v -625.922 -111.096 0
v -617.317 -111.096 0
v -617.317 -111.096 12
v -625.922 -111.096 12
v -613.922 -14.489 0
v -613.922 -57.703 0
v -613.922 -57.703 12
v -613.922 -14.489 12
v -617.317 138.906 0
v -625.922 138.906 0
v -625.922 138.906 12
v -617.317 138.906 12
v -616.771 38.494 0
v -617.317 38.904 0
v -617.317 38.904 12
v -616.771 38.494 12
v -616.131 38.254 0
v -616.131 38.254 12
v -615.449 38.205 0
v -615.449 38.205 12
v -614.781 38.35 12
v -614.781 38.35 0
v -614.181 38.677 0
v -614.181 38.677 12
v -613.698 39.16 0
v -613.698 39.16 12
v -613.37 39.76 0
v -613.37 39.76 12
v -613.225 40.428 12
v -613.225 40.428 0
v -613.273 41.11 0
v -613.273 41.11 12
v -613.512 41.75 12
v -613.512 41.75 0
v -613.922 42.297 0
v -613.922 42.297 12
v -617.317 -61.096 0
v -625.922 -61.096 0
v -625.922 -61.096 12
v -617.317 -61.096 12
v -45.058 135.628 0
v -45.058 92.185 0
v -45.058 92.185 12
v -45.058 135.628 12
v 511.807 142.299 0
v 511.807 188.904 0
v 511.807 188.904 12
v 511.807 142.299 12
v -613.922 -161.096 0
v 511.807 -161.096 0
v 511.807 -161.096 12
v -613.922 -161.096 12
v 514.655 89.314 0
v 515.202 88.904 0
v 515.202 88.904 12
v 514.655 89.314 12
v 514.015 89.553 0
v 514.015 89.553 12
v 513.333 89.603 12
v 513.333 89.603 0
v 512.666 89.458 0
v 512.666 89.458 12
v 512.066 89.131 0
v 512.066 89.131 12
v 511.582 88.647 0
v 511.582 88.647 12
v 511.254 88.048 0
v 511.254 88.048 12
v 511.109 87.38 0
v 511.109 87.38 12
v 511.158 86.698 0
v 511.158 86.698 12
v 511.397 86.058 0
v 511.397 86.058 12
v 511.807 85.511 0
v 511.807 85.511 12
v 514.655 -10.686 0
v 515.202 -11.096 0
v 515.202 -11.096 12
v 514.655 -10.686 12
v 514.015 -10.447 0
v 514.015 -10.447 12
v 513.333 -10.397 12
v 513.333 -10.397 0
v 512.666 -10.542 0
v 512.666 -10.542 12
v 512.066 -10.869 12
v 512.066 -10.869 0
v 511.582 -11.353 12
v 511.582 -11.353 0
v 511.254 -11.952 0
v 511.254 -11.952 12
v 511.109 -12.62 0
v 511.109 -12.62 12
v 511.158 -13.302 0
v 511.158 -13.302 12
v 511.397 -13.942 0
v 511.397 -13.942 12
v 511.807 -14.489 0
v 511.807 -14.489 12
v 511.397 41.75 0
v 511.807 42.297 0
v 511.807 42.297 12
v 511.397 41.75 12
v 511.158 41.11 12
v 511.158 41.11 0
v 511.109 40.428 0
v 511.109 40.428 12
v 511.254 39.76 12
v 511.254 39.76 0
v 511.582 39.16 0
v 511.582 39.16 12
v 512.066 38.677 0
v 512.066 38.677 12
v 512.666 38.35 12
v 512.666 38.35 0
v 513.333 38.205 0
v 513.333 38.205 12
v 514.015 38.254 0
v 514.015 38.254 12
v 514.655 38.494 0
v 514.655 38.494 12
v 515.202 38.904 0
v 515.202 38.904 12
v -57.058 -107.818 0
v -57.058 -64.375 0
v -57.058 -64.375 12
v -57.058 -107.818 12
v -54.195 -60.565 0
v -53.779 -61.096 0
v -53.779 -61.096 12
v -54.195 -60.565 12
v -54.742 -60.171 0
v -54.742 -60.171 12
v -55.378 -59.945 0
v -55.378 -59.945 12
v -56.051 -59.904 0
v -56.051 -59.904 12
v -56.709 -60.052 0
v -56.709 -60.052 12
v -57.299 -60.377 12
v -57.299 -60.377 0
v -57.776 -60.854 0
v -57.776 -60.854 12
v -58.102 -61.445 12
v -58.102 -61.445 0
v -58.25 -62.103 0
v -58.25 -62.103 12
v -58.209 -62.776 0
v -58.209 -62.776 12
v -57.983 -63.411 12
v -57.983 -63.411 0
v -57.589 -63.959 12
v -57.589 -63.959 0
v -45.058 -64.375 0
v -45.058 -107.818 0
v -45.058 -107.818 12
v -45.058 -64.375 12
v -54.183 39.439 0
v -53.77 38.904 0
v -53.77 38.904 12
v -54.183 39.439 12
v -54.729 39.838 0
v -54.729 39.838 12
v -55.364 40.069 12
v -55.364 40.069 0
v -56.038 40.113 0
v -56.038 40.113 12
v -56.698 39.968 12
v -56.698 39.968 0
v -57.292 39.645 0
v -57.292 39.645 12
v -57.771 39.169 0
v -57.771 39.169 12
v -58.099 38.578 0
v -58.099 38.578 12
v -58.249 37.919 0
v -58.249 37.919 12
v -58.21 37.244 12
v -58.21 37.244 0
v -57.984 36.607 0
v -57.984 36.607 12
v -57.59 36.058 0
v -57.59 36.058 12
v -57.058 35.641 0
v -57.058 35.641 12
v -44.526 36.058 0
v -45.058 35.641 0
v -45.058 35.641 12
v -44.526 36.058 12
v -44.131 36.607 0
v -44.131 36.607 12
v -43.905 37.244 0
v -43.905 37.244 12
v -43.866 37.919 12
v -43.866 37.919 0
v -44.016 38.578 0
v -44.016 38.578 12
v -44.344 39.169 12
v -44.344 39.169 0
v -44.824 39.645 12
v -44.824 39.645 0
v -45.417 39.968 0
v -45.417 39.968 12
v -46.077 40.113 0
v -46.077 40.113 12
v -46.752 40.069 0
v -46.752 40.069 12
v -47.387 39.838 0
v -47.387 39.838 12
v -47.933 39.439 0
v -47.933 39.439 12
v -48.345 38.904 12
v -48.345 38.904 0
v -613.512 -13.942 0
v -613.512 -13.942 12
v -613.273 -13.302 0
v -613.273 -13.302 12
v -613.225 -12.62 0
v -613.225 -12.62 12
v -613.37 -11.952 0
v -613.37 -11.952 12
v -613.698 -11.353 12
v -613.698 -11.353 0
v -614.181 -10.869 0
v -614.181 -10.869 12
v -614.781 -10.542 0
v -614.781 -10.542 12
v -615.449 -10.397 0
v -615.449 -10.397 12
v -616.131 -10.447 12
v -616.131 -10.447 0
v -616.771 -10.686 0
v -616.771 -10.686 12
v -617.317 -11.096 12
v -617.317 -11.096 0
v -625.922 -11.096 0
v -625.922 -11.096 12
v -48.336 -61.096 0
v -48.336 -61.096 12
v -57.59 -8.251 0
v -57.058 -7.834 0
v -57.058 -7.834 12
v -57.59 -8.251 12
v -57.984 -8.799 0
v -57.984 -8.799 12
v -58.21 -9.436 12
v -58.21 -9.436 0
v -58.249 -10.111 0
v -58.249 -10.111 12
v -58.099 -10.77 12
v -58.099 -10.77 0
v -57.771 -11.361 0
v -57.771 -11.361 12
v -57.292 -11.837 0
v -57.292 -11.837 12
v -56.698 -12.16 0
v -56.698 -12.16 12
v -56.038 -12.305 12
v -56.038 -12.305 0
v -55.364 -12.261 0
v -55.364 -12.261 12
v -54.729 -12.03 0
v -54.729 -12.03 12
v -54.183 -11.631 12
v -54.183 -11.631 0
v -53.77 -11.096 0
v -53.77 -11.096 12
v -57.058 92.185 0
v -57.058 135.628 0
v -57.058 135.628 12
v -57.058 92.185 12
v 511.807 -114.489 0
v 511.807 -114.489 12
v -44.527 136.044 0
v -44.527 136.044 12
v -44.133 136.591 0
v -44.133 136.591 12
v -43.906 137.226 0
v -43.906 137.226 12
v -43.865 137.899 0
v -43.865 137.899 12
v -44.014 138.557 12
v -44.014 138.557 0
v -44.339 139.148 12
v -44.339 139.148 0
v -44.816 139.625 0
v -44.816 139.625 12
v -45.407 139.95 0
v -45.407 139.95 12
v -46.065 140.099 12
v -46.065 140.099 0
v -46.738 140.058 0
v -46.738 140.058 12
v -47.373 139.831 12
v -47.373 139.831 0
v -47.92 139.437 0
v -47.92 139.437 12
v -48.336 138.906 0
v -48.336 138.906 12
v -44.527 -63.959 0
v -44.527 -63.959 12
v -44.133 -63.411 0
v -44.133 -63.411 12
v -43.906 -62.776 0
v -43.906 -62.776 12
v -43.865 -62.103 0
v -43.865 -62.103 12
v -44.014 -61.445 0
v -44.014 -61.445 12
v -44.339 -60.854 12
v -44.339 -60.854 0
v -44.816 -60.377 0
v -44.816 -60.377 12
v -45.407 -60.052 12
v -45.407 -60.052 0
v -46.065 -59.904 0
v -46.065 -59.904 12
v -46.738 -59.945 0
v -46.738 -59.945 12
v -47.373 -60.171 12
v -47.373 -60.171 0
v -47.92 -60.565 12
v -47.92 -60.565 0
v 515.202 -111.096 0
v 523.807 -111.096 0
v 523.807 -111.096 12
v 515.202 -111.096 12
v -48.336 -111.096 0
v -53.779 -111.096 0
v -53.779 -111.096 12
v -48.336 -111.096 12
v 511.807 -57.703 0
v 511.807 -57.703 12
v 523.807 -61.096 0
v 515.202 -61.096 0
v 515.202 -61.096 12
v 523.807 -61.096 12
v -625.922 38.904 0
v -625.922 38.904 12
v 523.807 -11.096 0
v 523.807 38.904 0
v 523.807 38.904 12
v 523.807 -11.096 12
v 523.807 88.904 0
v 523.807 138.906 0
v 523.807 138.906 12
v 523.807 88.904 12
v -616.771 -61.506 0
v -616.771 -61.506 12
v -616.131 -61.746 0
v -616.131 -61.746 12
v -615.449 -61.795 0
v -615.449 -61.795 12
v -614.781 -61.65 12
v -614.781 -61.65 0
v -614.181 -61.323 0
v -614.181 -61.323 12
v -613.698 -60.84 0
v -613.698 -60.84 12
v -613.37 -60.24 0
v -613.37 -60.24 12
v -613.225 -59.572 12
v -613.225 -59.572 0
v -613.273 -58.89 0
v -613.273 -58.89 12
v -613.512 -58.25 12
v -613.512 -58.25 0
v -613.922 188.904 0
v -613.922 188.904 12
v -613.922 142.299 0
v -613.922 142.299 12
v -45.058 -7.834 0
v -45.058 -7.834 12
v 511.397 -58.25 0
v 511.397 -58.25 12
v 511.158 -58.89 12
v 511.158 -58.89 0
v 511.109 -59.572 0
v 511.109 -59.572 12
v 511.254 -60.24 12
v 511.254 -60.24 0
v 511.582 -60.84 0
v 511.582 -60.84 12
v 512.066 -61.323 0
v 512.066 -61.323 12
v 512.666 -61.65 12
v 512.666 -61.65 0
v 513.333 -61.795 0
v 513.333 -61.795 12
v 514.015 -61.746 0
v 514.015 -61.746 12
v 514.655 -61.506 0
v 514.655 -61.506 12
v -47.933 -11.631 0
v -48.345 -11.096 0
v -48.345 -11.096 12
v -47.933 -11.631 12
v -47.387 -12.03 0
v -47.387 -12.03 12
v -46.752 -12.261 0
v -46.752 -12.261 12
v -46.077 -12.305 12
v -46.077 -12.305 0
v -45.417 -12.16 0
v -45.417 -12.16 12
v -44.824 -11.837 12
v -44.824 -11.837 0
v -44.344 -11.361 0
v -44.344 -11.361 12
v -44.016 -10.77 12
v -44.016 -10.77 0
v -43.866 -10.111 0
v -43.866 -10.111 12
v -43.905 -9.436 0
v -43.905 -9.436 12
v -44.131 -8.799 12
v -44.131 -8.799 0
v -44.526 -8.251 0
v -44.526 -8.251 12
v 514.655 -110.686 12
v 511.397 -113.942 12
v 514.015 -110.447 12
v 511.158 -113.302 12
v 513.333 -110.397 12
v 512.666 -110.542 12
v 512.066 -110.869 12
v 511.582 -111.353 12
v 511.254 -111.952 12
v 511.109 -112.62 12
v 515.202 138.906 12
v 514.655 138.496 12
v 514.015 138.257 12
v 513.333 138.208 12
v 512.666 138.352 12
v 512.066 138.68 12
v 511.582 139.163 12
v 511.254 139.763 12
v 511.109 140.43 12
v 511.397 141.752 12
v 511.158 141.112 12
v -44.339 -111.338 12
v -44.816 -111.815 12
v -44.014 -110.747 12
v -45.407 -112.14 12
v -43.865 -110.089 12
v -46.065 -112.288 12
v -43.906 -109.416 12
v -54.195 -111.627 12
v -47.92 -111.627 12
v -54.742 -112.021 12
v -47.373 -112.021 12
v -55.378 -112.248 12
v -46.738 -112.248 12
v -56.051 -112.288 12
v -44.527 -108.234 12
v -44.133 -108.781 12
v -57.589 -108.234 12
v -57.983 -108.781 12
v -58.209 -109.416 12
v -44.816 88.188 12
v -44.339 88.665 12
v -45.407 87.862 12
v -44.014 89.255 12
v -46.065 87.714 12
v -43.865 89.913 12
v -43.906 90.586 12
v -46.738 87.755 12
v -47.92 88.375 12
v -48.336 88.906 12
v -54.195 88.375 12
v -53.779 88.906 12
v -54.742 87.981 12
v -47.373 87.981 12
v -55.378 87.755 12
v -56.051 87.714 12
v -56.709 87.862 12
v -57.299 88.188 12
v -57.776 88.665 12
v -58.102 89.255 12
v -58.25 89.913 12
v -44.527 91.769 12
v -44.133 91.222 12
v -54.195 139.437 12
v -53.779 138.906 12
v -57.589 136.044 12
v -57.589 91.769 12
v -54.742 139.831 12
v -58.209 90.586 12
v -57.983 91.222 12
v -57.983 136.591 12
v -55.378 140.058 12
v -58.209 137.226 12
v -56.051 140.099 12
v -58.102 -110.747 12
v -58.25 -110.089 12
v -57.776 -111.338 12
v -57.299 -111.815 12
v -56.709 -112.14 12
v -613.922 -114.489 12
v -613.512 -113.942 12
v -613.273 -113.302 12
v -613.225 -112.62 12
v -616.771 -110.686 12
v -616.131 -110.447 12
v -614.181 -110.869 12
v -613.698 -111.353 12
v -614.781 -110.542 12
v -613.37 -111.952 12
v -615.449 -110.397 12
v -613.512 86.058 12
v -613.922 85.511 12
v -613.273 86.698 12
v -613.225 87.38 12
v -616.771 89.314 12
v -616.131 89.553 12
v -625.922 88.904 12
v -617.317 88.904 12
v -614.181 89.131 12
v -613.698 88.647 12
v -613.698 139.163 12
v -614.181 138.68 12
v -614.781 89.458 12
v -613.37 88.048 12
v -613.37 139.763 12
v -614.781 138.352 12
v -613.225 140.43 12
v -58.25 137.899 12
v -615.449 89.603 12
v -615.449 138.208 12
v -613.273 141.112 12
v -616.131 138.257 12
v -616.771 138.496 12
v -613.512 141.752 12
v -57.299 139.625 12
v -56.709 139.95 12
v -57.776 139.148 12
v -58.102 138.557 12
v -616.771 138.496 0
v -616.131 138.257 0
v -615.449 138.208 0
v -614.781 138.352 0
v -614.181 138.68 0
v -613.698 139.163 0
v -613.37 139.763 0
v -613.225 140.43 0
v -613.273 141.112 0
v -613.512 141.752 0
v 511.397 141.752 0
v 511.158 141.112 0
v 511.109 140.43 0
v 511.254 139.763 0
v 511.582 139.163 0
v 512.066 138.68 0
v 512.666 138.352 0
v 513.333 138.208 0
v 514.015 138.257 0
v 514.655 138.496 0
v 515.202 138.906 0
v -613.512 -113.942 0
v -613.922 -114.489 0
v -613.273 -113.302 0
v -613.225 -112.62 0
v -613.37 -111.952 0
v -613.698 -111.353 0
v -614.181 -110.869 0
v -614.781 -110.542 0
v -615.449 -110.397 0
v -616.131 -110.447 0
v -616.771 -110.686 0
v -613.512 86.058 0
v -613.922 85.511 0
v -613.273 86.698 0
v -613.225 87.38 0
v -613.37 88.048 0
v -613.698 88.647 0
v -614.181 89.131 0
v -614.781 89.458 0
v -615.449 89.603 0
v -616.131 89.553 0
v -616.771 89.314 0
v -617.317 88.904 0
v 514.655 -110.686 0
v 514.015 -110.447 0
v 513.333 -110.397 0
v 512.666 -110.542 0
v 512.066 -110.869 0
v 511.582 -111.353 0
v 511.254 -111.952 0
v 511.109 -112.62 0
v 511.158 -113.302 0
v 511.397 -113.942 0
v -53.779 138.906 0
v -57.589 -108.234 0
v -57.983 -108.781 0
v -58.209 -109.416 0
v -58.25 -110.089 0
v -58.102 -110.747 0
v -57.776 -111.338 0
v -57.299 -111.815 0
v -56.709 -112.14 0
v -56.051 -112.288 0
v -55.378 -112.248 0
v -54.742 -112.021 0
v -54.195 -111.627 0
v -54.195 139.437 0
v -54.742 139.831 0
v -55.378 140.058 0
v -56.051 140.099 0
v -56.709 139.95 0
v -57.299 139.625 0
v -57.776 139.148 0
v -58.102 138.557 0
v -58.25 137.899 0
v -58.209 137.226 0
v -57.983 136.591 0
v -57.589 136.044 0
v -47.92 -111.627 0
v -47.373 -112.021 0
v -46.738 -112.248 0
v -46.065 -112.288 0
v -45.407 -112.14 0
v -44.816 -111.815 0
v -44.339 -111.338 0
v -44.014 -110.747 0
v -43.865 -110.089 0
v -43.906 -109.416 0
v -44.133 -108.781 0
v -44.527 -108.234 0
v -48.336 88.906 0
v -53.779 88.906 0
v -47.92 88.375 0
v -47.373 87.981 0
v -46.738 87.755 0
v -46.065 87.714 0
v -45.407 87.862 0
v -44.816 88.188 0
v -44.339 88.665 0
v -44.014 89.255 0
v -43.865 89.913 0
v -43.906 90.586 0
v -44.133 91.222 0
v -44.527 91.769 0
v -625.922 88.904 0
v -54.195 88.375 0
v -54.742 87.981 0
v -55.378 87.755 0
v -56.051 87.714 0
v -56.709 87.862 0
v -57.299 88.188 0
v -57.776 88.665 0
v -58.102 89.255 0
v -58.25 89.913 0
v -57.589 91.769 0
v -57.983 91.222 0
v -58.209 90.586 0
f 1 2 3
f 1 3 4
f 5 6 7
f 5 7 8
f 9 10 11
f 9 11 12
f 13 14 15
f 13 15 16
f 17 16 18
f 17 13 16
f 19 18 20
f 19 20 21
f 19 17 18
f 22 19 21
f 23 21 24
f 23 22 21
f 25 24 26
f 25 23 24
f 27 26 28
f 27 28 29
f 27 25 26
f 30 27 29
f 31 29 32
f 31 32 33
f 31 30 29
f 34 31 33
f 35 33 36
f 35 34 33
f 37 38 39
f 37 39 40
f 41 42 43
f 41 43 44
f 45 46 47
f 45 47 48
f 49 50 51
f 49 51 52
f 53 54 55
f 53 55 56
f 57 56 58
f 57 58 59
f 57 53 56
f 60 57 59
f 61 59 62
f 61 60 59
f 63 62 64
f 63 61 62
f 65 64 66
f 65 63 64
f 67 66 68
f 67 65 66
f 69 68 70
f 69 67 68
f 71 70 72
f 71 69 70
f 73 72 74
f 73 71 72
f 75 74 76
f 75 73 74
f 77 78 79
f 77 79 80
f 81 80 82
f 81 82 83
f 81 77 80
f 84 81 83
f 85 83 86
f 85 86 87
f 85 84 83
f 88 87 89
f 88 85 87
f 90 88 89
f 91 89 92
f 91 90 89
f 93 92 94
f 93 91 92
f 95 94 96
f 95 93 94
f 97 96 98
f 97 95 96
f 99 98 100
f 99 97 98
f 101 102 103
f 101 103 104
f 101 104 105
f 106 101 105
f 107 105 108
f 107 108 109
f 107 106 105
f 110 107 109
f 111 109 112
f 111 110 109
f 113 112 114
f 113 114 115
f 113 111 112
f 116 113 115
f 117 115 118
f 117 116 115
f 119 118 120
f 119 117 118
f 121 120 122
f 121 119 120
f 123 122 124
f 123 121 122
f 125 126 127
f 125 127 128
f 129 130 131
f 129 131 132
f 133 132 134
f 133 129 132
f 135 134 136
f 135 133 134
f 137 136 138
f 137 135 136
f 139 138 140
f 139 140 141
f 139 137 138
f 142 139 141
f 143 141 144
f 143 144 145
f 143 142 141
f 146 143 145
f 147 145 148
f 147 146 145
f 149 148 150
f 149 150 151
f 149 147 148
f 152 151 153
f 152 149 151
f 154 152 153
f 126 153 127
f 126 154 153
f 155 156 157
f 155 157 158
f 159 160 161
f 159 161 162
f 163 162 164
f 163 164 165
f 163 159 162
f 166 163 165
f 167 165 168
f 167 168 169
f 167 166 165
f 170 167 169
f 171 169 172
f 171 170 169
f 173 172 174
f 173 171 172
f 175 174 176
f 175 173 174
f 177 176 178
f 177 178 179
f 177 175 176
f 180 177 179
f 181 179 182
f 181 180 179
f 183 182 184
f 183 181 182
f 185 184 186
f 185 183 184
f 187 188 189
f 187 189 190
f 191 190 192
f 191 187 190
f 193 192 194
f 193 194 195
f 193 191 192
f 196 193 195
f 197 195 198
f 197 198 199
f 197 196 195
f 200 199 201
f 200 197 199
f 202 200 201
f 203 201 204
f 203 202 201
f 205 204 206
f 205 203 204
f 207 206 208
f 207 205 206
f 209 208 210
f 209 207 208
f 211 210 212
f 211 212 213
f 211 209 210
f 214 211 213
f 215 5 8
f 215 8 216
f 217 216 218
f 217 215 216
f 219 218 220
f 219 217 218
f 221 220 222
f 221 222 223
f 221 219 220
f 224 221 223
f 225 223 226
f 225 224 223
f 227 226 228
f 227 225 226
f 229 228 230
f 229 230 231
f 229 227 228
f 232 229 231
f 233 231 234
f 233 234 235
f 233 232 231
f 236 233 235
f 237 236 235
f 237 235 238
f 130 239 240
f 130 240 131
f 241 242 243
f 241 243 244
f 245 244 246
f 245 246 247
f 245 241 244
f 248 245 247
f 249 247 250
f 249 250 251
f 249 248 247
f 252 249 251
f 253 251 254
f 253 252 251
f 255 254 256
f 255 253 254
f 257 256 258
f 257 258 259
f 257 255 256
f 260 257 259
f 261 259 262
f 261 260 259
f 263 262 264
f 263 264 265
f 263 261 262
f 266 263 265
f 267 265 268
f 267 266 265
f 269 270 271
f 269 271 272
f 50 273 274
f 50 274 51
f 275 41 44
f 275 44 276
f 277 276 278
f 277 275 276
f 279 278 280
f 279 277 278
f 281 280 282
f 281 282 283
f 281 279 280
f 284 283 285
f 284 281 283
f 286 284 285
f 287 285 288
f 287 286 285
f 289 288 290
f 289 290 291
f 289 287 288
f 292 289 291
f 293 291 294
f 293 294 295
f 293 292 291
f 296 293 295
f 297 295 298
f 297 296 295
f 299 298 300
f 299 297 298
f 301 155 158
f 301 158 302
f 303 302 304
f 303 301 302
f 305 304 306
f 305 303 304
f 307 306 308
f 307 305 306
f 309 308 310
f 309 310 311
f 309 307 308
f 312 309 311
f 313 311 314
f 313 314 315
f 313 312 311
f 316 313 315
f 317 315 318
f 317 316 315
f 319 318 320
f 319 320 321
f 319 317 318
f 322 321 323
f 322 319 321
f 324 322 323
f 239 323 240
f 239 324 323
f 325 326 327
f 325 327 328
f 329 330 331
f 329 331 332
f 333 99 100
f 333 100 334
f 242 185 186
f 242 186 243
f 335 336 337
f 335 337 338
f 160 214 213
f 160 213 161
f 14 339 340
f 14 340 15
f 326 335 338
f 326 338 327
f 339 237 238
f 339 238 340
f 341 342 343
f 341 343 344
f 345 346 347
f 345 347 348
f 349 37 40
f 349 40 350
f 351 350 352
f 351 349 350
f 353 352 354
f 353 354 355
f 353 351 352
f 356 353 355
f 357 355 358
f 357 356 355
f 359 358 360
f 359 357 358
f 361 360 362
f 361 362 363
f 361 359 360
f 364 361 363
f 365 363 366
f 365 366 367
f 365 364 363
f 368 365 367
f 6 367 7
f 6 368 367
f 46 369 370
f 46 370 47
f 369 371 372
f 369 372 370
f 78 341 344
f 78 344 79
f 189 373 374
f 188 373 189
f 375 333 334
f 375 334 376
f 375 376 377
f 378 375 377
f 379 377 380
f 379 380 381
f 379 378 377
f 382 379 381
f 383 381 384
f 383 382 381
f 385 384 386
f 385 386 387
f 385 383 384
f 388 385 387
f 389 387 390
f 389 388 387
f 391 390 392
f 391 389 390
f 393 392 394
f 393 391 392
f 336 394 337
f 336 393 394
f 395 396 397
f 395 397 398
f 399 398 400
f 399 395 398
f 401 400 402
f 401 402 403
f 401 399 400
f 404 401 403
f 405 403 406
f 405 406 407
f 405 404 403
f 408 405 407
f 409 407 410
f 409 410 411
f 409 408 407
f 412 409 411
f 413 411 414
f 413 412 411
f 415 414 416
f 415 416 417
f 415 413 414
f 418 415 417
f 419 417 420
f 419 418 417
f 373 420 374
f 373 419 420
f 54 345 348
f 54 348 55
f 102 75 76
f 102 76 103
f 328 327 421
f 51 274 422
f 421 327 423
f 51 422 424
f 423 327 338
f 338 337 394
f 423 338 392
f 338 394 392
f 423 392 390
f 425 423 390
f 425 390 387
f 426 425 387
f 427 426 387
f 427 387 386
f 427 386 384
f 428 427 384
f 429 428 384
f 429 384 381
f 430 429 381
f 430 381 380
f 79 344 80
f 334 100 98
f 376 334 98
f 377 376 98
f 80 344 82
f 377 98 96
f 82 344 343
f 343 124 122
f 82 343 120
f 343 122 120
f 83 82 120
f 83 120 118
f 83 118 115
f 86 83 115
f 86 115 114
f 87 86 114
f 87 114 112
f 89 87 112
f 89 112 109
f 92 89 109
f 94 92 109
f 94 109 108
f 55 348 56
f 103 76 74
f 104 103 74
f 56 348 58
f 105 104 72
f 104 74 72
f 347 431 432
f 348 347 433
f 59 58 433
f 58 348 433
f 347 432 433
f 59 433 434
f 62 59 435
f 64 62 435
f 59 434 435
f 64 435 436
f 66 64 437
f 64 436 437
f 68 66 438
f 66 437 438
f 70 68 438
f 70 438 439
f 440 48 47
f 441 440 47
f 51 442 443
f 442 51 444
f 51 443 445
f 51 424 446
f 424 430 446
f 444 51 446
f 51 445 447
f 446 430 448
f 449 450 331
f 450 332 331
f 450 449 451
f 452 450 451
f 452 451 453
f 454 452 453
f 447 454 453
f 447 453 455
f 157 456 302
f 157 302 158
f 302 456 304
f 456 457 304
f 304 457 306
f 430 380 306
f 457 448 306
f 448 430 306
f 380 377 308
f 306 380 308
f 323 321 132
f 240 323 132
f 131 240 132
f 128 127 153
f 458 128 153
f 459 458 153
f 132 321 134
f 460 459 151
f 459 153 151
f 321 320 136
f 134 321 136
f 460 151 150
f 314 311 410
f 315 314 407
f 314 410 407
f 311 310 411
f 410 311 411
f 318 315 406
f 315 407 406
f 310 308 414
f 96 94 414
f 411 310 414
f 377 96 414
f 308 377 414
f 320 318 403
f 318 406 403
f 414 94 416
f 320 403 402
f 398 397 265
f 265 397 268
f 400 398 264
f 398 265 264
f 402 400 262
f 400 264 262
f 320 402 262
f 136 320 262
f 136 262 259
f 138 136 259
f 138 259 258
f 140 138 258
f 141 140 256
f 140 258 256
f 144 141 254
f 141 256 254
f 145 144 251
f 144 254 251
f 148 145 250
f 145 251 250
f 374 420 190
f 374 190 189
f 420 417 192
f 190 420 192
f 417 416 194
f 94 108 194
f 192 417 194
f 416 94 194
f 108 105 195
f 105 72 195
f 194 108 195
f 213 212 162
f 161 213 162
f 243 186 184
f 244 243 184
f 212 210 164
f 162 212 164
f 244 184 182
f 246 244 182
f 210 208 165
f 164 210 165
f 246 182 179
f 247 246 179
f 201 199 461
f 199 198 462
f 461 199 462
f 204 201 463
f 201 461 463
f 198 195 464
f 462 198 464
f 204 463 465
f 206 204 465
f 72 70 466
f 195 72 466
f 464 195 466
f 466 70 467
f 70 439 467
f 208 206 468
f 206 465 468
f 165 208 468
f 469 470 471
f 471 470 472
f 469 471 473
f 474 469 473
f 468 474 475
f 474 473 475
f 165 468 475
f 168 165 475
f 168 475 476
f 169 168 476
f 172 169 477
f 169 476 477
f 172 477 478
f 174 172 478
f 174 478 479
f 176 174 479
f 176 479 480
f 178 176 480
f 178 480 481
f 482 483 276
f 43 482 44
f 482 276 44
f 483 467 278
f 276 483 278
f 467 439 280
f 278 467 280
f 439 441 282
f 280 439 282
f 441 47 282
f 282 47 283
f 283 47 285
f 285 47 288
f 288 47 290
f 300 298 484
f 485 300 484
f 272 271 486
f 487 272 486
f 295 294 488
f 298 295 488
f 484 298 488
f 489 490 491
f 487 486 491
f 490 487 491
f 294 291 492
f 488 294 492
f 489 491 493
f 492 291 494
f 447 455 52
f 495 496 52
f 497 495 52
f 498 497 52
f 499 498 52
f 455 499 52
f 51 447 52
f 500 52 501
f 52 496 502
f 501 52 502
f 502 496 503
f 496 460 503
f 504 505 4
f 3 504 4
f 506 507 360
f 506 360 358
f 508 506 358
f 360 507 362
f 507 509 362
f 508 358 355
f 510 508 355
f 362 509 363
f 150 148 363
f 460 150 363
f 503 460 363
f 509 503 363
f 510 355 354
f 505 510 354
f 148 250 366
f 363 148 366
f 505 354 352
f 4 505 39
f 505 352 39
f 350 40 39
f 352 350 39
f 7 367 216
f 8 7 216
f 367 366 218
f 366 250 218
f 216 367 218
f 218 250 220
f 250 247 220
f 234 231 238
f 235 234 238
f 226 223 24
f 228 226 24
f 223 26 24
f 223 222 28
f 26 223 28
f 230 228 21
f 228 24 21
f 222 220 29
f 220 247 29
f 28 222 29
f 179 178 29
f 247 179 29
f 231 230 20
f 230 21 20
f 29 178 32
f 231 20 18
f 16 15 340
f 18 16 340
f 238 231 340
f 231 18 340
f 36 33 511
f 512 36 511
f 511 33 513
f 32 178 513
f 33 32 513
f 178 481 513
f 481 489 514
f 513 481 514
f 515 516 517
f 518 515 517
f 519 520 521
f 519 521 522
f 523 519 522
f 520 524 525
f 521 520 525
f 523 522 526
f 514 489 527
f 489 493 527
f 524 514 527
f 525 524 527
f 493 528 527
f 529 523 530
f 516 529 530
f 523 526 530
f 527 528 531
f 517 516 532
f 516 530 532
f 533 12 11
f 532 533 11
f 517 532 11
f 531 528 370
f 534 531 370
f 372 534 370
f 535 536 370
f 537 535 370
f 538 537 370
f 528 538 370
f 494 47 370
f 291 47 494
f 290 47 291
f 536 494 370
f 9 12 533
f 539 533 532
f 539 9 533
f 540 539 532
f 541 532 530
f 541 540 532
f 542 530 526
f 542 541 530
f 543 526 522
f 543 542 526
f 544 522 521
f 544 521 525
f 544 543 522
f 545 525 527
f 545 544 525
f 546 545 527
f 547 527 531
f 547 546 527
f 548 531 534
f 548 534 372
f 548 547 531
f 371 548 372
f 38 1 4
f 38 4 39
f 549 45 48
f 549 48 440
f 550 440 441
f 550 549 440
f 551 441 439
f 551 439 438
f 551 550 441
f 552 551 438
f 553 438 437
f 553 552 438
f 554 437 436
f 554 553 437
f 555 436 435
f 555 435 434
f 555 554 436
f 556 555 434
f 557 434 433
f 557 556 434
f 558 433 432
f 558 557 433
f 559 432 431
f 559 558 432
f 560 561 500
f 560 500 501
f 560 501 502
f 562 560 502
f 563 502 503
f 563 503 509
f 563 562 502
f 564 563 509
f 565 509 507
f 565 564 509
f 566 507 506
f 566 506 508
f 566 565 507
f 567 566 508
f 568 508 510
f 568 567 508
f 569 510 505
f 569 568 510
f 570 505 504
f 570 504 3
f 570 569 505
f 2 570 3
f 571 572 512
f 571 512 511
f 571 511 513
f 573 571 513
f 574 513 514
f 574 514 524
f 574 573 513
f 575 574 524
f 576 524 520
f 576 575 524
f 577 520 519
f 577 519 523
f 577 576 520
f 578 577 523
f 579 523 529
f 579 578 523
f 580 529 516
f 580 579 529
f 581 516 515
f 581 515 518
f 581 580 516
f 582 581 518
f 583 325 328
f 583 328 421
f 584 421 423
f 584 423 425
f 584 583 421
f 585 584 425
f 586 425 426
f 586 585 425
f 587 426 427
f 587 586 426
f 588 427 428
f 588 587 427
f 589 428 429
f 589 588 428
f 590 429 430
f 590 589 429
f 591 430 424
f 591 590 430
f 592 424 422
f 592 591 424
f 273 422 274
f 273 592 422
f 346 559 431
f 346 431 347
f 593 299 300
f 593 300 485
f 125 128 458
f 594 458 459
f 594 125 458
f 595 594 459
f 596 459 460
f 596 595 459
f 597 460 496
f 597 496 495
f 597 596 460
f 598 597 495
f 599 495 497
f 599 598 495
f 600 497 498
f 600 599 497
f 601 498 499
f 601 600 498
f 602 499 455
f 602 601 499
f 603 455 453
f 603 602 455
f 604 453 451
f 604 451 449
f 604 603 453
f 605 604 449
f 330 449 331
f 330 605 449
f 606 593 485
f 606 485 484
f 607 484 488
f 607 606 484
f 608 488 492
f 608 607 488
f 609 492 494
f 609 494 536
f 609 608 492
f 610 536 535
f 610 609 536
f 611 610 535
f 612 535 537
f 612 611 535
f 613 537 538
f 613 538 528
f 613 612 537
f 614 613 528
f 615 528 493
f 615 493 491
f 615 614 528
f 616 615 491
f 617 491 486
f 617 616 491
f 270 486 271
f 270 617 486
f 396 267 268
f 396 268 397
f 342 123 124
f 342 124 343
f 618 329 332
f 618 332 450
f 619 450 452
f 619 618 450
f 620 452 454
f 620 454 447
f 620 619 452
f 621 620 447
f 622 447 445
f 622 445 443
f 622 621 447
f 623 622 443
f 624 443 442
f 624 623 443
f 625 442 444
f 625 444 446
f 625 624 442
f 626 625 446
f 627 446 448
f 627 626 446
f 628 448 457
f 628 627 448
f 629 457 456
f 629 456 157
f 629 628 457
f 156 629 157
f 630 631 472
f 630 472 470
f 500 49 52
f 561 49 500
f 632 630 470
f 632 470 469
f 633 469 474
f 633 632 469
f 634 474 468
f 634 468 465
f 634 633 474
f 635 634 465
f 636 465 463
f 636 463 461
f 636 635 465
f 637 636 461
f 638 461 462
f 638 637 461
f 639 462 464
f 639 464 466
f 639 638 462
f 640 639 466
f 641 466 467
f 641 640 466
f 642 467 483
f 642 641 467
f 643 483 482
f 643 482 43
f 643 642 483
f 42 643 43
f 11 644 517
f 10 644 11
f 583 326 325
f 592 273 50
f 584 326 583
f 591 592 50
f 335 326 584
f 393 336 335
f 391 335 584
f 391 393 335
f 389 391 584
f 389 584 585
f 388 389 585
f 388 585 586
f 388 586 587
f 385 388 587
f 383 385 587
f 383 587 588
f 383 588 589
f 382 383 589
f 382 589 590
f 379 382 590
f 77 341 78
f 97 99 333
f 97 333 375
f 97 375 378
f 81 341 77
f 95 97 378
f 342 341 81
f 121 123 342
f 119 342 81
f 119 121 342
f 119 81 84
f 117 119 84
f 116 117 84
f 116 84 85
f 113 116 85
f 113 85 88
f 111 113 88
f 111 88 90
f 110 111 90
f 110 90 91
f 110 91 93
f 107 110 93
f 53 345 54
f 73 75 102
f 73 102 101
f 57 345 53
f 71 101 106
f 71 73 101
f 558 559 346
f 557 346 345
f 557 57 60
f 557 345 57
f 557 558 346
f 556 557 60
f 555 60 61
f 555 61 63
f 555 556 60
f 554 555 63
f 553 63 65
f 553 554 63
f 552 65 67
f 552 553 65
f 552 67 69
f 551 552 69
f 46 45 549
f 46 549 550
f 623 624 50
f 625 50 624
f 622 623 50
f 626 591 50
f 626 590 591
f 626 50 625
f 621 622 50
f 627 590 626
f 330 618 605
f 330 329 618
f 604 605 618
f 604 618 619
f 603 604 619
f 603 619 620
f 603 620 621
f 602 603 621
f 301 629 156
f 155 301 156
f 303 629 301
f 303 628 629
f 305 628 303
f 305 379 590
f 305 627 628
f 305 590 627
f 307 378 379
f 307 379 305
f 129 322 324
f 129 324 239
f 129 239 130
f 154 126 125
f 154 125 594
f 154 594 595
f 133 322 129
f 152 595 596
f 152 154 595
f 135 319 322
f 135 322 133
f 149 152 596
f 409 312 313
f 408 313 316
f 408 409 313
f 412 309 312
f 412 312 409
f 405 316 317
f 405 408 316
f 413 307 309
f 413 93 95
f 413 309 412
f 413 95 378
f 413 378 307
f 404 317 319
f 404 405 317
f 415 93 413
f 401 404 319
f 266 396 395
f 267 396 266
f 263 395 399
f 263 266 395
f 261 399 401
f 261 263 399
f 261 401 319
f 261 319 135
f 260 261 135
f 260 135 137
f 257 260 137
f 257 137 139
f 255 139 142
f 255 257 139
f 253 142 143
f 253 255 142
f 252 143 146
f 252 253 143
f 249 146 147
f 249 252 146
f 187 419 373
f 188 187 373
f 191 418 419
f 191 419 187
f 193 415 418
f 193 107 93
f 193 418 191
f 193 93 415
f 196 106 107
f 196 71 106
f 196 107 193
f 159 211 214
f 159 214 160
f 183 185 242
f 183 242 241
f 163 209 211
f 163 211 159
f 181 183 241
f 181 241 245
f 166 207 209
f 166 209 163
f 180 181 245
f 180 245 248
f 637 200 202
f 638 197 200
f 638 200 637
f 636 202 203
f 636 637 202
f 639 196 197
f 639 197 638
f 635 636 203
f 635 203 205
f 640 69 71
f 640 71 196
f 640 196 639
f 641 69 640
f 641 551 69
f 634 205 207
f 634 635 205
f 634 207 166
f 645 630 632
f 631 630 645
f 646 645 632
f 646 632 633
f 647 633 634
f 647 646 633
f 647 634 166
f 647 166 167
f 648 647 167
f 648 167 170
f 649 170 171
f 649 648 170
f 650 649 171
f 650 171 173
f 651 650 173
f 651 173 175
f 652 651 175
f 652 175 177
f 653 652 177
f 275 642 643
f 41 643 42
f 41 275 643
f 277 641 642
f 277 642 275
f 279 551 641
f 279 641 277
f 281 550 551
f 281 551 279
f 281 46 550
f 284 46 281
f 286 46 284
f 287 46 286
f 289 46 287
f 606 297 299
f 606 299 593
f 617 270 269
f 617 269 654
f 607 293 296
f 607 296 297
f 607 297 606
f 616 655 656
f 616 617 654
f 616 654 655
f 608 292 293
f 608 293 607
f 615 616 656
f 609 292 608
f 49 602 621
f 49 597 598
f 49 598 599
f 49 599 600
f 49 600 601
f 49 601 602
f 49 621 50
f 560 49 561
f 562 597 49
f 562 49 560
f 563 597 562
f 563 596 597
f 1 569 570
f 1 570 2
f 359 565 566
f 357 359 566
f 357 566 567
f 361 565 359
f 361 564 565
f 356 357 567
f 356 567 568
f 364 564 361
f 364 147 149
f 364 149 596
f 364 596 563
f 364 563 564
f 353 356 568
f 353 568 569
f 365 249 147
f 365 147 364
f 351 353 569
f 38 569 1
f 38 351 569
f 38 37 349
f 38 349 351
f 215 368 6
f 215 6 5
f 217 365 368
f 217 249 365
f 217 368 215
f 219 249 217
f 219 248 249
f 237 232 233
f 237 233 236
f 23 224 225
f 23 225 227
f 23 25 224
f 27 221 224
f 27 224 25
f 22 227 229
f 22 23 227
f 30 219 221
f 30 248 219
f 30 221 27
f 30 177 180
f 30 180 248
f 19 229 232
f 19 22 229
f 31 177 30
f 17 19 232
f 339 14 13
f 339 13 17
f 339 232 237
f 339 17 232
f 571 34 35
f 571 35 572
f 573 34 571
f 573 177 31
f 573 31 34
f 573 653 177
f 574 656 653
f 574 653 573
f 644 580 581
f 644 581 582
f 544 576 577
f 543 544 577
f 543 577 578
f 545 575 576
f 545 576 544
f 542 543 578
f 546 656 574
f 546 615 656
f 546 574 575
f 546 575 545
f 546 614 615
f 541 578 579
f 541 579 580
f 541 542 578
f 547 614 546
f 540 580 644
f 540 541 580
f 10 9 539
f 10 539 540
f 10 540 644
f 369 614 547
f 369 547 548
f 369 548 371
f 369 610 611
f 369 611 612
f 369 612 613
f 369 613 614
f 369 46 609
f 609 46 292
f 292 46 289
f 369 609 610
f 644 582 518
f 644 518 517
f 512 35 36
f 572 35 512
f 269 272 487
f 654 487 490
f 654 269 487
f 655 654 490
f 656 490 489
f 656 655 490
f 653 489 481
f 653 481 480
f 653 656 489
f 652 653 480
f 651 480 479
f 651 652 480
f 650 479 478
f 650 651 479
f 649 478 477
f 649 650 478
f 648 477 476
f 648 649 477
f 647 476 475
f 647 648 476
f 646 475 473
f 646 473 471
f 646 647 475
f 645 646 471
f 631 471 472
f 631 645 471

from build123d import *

# Parameters (mm, degrees)
BOSS_EXTRUDE1_DEPTH = 12


with BuildPart() as part:
    # Sketch1 → Boss-Extrude1 (new body)
    with BuildSketch(Plane.XY):
        with BuildLine():
            Line((511.8067094, 188.903885219), (511.8067094, 142.299329353))
            ThreePointArc((511.8067094, 142.299329353), (511.806507744, 138.903885219), (515.20195099, 138.906348311))
            Line((515.20195099, 138.906348311), (523.8067094, 138.906348311))
            Line((523.8067094, 138.906348311), (523.8067094, 138.319810176))
            Line((523.8067094, 138.319810176), (523.8067094, 88.903885219))
            Line((523.8067094, 88.903885219), (518.8067094, 88.903885219))
            Line((518.8067094, 88.903885219), (515.20195099, 88.903885219))
            ThreePointArc((515.20195099, 88.903885219), (511.806507744, 88.906348311), (511.8067094, 85.510904177))
            Line((511.8067094, 85.510904177), (511.8067094, 42.296866261))
            ThreePointArc((511.8067094, 42.296866261), (511.806507744, 38.901422127), (515.20195099, 38.903885219))
            Line((515.20195099, 38.903885219), (518.8067094, 38.903885219))
            Line((518.8067094, 38.903885219), (523.8067094, 38.903885219))
            Line((523.8067094, 38.903885219), (523.8067094, -11.096114781))
            Line((523.8067094, -11.096114781), (518.8067094, -11.096114781))
            Line((518.8067094, -11.096114781), (515.20195099, -11.096114781))
            ThreePointArc((515.20195099, -11.096114781), (511.806507744, -11.093651689), (511.8067094, -14.489095823))
            Line((511.8067094, -14.489095823), (511.8067094, -57.703133739))
            ThreePointArc((511.8067094, -57.703133739), (511.806507744, -61.098577873), (515.20195099, -61.096114781))
            Line((515.20195099, -61.096114781), (518.8067094, -61.096114781))
            Line((518.8067094, -61.096114781), (523.8067094, -61.096114781))
            Line((523.8067094, -61.096114781), (523.8067094, -111.096114781))
            Line((523.8067094, -111.096114781), (518.8067094, -111.096114781))
            Line((518.8067094, -111.096114781), (515.20195099, -111.096114781))
            ThreePointArc((515.20195099, -111.096114781), (511.806507744, -111.093651689), (511.8067094, -114.489095823))
            Line((511.8067094, -114.489095823), (511.8067094, -161.096114781))
            Line((511.8067094, -161.096114781), (-613.922135209, -161.096114781))
            Line((-613.922135209, -161.096114781), (-613.922135209, -114.489095823))
            ThreePointArc((-613.922135209, -114.489095823), (-613.921933554, -111.093651689), (-617.3173768, -111.096114781))
            Line((-617.3173768, -111.096114781), (-620.922135209, -111.096114781))
            Line((-620.922135209, -111.096114781), (-625.922135209, -111.096114781))
            Line((-625.922135209, -111.096114781), (-625.922135209, -61.096114781))
            Line((-625.922135209, -61.096114781), (-620.922135209, -61.096114781))
            Line((-620.922135209, -61.096114781), (-617.3173768, -61.096114781))
            ThreePointArc((-617.3173768, -61.096114781), (-613.921933554, -61.098577873), (-613.922135209, -57.703133739))
            Line((-613.922135209, -57.703133739), (-613.922135209, -14.489095823))
            ThreePointArc((-613.922135209, -14.489095823), (-613.921933554, -11.093651689), (-617.3173768, -11.096114781))
            Line((-617.3173768, -11.096114781), (-620.922135209, -11.096114781))
            Line((-620.922135209, -11.096114781), (-625.922135209, -11.096114781))
            Line((-625.922135209, -11.096114781), (-625.922135209, 38.903885219))
            Line((-625.922135209, 38.903885219), (-620.922135209, 38.903885219))
            Line((-620.922135209, 38.903885219), (-617.3173768, 38.903885219))
            ThreePointArc((-617.3173768, 38.903885219), (-613.921933554, 38.901422127), (-613.922135209, 42.296866261))
            Line((-613.922135209, 42.296866261), (-613.922135209, 85.510904177))
            ThreePointArc((-613.922135209, 85.510904177), (-613.921933554, 88.906348311), (-617.3173768, 88.903885219))
            Line((-617.3173768, 88.903885219), (-620.922135209, 88.903885219))
            Line((-620.922135209, 88.903885219), (-625.922135209, 88.903885219))
            Line((-625.922135209, 88.903885219), (-625.922135209, 138.319810176))
            Line((-625.922135209, 138.319810176), (-625.922135209, 138.906348311))
            Line((-625.922135209, 138.906348311), (-617.3173768, 138.906348311))
            ThreePointArc((-617.3173768, 138.906348311), (-613.921933554, 138.903885219), (-613.922135209, 142.299329353))
            Line((-613.922135209, 142.299329353), (-613.922135209, 188.903885219))
            Line((-613.922135209, 188.903885219), (511.8067094, 188.903885219))
        make_face()
        with BuildLine():
            Line((-48.336173874, 138.906348311), (-53.779251936, 138.906348311))
            ThreePointArc((-53.779251936, 138.906348311), (-57.55476918, 139.403404586), (-57.057712905, 135.627887342))
            Line((-57.057712905, 135.627887342), (-57.057712905, 92.18480928))
            ThreePointArc((-57.057712905, 92.18480928), (-57.55476918, 88.409292036), (-53.779251936, 88.906348311))
            Line((-53.779251936, 88.906348311), (-48.336173874, 88.906348311))
            ThreePointArc((-48.336173874, 88.906348311), (-44.56065663, 88.409292036), (-45.057712905, 92.18480928))
            Line((-45.057712905, 92.18480928), (-45.057712905, 135.627887342))
            ThreePointArc((-45.057712905, 135.627887342), (-44.56065663, 139.403404586), (-48.336173874, 138.906348311))
        make_face(mode=Mode.SUBTRACT)
        with BuildLine():
            Line((-48.345370421, 38.903885219), (-53.770055388, 38.903885219))
            ThreePointArc((-53.770055388, 38.903885219), (-57.548209819, 39.423547352), (-57.057712905, 35.641496003))
            Line((-57.057712905, 35.641496003), (-57.057712905, -7.833725565))
            ThreePointArc((-57.057712905, -7.833725565), (-57.548209819, -11.615776914), (-53.770055388, -11.096114781))
            Line((-53.770055388, -11.096114781), (-48.345370421, -11.096114781))
            ThreePointArc((-48.345370421, -11.096114781), (-44.567215991, -11.615776914), (-45.057712905, -7.833725565))
            Line((-45.057712905, -7.833725565), (-45.057712905, 35.641496003))
            ThreePointArc((-45.057712905, 35.641496003), (-44.567215991, 39.423547352), (-48.345370421, 38.903885219))
        make_face(mode=Mode.SUBTRACT)
        with BuildLine():
            Line((-48.336173874, -61.096114781), (-53.779251936, -61.096114781))
            ThreePointArc((-53.779251936, -61.096114781), (-57.55476918, -60.599058506), (-57.057712905, -64.37457575))
            Line((-57.057712905, -64.37457575), (-57.057712905, -107.817653812))
            ThreePointArc((-57.057712905, -107.817653812), (-57.55476918, -111.593171056), (-53.779251936, -111.096114781))
            Line((-53.779251936, -111.096114781), (-48.336173874, -111.096114781))
            ThreePointArc((-48.336173874, -111.096114781), (-44.56065663, -111.593171056), (-45.057712905, -107.817653812))
            Line((-45.057712905, -107.817653812), (-45.057712905, -64.37457575))
            ThreePointArc((-45.057712905, -64.37457575), (-44.56065663, -60.599058506), (-48.336173874, -61.096114781))
        make_face(mode=Mode.SUBTRACT)
    extrude(amount=BOSS_EXTRUDE1_DEPTH)


solid = part.part
